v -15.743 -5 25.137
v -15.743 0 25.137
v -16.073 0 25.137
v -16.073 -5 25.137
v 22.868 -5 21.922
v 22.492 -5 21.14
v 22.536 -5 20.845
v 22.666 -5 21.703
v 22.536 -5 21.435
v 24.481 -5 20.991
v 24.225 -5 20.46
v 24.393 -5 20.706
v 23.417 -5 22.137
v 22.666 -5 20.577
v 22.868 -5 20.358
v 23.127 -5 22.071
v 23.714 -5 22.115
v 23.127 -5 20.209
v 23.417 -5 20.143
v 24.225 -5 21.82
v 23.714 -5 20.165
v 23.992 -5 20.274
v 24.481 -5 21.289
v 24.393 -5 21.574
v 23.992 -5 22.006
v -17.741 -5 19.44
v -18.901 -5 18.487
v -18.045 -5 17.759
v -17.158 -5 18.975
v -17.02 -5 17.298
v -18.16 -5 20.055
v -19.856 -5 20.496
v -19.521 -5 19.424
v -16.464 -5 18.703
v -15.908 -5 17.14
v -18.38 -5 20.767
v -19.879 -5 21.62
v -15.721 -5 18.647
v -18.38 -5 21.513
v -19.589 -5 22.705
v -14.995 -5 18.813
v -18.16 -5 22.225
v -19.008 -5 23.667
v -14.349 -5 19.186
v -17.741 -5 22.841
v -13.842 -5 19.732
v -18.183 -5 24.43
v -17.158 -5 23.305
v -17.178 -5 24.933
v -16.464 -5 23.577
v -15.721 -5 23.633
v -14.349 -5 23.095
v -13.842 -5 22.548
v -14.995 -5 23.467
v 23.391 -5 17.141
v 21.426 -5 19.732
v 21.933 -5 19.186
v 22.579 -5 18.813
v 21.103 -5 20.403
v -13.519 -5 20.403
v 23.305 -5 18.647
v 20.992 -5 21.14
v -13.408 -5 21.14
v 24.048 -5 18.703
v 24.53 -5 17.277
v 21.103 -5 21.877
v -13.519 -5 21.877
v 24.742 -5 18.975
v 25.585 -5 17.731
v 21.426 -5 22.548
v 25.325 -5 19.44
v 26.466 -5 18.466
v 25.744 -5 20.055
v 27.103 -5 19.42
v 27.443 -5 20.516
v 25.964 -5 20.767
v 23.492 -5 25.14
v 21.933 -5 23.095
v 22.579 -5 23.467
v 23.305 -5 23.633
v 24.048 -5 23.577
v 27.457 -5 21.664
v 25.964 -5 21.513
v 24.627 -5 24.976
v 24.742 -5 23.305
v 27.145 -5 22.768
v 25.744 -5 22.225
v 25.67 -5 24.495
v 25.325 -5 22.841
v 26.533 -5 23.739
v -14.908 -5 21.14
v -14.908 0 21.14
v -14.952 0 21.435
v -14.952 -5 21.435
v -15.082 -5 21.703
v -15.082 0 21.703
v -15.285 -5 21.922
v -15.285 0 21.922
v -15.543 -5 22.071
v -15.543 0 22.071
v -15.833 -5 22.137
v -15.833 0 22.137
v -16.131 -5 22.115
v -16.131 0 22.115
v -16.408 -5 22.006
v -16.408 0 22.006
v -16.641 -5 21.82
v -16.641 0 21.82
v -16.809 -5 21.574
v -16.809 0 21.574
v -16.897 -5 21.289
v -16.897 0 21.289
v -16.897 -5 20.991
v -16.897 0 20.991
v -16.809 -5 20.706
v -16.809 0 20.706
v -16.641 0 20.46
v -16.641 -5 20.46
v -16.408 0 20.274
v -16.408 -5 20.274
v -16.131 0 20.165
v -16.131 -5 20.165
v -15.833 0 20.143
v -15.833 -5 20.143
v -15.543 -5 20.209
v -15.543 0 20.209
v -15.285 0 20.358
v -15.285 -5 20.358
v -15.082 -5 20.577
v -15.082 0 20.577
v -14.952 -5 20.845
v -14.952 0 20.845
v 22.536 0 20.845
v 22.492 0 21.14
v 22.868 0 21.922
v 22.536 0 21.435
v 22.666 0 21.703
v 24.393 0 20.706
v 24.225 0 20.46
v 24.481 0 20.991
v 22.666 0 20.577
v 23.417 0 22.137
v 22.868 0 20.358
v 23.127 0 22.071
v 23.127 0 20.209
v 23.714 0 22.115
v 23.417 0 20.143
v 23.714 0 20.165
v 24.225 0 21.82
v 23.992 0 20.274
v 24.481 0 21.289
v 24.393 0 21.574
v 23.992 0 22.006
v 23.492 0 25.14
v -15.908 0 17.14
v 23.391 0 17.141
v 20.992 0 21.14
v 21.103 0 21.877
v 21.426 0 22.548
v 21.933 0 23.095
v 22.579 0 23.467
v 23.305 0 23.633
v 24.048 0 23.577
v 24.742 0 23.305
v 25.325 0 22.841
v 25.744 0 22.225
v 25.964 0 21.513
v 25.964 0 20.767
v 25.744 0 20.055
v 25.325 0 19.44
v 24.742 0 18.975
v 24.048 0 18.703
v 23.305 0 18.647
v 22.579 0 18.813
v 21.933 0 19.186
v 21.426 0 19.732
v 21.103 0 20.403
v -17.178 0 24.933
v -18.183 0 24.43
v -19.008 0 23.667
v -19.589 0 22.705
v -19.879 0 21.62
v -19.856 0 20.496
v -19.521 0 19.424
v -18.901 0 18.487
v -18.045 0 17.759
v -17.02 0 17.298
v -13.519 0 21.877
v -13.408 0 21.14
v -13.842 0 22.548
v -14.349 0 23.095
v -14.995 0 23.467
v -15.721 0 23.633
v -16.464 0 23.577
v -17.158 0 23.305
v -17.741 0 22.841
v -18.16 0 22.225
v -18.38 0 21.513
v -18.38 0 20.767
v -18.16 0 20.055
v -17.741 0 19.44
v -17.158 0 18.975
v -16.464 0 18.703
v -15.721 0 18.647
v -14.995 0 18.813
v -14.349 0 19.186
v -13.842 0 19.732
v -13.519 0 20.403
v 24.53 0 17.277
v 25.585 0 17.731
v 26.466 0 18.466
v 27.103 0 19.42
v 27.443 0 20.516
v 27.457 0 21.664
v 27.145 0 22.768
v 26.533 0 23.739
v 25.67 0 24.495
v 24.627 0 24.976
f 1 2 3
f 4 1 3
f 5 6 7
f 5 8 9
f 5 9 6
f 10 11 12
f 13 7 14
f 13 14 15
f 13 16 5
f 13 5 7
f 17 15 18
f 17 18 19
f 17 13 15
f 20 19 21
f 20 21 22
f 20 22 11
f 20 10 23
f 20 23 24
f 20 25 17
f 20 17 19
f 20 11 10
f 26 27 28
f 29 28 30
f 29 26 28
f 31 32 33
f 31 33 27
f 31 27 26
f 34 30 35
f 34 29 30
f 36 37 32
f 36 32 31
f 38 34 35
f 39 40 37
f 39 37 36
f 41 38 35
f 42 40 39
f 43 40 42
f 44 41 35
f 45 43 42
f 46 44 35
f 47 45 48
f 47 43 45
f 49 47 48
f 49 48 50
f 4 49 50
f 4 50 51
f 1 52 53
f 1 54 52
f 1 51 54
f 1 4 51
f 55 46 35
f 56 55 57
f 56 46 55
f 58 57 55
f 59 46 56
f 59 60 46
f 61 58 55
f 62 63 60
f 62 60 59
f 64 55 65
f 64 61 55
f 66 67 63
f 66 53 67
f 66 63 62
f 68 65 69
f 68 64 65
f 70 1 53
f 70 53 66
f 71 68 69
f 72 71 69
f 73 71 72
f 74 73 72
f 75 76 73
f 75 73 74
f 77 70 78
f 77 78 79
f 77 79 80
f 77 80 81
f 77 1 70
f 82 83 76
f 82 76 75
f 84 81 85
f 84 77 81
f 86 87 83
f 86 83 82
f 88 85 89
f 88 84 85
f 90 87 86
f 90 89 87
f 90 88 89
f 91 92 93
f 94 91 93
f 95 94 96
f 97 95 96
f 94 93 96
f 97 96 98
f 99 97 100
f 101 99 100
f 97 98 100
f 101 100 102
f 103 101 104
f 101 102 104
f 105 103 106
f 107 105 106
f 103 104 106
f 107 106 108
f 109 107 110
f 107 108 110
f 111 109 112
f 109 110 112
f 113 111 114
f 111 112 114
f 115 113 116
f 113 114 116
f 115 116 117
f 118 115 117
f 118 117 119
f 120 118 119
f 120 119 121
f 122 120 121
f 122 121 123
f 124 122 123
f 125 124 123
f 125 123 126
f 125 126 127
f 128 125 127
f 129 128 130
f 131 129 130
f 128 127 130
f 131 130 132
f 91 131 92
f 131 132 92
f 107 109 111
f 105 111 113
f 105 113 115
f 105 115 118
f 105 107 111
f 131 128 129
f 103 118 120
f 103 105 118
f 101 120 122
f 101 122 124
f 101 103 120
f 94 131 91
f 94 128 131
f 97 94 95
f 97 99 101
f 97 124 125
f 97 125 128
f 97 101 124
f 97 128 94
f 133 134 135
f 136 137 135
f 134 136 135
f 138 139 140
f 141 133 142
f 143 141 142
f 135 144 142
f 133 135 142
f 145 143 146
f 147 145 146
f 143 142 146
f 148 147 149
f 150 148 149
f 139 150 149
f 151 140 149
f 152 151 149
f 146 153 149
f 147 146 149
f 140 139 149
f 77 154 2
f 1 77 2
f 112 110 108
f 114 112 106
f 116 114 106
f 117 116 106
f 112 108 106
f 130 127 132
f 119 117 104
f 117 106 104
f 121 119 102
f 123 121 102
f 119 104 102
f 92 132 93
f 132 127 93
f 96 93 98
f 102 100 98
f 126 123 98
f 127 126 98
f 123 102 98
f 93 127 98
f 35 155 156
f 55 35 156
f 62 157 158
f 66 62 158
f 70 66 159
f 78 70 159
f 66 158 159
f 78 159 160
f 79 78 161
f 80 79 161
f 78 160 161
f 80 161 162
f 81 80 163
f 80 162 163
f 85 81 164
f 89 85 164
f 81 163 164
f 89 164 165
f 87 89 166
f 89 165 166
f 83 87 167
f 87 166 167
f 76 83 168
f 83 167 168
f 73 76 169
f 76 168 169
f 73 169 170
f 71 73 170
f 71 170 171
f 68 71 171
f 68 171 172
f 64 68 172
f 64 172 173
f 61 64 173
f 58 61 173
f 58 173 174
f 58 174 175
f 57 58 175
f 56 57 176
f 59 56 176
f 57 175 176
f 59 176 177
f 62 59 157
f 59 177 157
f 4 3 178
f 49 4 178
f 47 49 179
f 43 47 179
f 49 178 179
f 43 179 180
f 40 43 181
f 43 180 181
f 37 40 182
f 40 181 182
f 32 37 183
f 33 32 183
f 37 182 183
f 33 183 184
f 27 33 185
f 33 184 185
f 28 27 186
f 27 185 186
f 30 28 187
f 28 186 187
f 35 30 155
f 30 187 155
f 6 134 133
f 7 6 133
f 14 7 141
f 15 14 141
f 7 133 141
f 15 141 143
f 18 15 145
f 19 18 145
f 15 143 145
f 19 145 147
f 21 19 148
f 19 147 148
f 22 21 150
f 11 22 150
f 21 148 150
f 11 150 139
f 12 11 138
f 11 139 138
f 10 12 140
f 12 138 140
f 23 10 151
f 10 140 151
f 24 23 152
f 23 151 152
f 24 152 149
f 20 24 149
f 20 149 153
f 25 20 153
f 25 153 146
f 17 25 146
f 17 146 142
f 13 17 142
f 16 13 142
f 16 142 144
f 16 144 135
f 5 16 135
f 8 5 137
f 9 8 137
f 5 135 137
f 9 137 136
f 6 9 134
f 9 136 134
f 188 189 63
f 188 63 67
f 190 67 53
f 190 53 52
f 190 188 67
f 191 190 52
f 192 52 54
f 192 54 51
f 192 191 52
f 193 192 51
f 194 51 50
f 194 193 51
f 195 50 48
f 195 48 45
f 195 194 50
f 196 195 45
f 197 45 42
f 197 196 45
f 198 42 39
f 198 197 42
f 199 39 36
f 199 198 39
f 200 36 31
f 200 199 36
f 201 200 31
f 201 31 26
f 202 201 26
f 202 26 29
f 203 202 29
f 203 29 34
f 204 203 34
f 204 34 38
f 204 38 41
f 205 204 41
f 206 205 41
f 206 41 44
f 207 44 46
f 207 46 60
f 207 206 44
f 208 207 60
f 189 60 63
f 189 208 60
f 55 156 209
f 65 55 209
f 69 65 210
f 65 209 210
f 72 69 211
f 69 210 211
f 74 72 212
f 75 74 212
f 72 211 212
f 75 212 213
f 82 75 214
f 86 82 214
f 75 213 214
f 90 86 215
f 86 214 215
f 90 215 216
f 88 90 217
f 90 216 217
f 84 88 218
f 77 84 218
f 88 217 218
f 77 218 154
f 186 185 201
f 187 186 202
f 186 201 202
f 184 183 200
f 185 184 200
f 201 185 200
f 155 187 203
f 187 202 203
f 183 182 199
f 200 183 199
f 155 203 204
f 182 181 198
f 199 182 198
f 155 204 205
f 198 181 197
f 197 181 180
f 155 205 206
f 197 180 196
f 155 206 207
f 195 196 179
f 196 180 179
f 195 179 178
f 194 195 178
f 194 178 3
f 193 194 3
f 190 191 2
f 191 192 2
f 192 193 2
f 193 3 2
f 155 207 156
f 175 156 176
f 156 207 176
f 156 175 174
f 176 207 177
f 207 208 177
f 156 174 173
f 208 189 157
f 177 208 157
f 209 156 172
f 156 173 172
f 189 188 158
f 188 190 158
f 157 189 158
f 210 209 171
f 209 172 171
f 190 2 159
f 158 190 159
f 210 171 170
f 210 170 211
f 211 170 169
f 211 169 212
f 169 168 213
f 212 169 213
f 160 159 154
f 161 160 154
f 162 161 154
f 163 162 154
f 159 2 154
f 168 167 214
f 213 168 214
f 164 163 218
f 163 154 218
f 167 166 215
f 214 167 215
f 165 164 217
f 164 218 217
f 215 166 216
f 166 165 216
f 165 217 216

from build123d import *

# Parameters (mm, degrees)
F0_R     = 2.5
F1_DEPTH = 5
F0_R_2   = 1
F2_DEPTH = 5


with BuildPart() as f1:
    # F0 (on Front) → F1 (new body)
    with BuildSketch(Plane.XZ):
        with BuildLine():
            Line((23.491598, 25.140082), (-15.743496, 25.136695))
            Line((-15.743496, 25.136695), (-16.073308, 25.136667))
            ThreePointArc((-16.073308, 25.136667), (-19.907202, 21.057374), (-15.907927, 17.140082))
            Line((-15.907927, 17.140082), (23.390915, 17.141358))
            ThreePointArc((23.390915, 17.141358), (27.491626, 21.089736), (23.491598, 25.140082))
        make_face()
        with Locations((-15.908057, 21.140082)):
            Circle(F0_R, mode=Mode.SUBTRACT)
        with BuildLine():
            ThreePointArc((25.991943, 21.140082), (23.491943, 18.640082), (20.991943, 21.140082))
            ThreePointArc((20.991943, 21.140082), (23.491943, 23.640082), (25.991943, 21.140082))
        make_face(mode=Mode.SUBTRACT)
    extrude(amount=F1_DEPTH)


with BuildPart() as f2:
    # F0 (on Front) → F2 (new body)
    with BuildSketch(Plane.XZ):
        with Locations((-15.908057, 21.140082)):
            Circle(F0_R_2)
        with BuildLine():
            ThreePointArc((24.491943, 21.140082), (23.491943, 22.140082), (22.491943, 21.140082))
            ThreePointArc((22.491943, 21.140082), (23.491943, 20.140082), (24.491943, 21.140082))
        make_face()
    extrude(amount=F2_DEPTH)


solid = Compound([f1.part, f2.part])
